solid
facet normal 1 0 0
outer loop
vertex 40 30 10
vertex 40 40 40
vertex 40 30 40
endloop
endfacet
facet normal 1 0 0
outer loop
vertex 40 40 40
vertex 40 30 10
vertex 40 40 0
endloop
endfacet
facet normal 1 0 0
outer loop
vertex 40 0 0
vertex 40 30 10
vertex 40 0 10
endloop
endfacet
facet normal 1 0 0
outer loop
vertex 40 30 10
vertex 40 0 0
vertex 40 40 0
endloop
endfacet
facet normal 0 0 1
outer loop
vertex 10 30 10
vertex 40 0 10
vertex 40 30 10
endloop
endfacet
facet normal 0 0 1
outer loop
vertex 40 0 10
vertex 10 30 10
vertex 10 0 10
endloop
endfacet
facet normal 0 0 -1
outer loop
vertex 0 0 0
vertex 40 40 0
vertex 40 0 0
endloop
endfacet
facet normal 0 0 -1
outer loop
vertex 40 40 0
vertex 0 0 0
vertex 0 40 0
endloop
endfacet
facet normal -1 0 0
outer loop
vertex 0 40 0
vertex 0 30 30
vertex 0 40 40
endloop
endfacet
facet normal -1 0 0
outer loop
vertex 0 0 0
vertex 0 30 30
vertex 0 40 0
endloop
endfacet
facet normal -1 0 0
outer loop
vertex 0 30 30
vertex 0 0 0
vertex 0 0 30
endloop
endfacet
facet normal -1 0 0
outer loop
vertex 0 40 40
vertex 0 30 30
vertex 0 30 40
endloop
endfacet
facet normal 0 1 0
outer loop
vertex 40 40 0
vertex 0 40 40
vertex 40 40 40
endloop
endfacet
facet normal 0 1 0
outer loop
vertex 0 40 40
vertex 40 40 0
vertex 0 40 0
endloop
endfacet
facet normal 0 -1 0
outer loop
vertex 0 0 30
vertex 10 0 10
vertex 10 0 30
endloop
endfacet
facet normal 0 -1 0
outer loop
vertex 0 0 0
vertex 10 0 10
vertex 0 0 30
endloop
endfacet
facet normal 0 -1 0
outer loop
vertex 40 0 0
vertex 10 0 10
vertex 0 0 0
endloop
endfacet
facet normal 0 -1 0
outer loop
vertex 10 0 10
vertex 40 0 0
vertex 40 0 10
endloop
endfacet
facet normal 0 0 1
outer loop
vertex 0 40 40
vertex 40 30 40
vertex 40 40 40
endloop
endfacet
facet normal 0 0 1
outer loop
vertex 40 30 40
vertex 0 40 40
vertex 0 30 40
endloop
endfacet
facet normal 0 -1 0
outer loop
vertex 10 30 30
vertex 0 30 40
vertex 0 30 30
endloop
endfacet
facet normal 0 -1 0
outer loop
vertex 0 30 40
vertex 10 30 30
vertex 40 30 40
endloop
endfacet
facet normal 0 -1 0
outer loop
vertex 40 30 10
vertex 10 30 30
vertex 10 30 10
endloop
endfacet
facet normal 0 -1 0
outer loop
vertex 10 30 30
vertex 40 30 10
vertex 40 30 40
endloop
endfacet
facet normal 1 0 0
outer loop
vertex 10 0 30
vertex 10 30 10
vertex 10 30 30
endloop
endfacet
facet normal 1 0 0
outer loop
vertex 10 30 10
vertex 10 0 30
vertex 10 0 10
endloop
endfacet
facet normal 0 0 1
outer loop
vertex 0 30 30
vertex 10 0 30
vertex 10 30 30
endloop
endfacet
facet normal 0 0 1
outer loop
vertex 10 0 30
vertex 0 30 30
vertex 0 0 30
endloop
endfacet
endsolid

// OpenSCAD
cube([40,40,10]);
translate([0,30,0])
cube([40,10,40]);
translate([0,0,0])
cube([10,40,30]);
